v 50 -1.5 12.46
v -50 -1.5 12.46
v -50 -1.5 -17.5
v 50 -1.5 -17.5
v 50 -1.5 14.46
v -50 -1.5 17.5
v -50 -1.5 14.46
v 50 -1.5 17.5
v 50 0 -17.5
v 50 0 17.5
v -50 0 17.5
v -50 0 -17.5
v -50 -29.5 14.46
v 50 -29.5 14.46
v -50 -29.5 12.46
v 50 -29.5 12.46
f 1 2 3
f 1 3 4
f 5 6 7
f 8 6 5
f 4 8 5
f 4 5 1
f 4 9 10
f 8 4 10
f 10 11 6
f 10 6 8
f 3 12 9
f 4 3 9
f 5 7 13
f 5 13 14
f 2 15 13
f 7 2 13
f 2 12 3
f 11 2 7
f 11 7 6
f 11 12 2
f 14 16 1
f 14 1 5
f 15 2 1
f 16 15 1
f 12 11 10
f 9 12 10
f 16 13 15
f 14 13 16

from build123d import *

# Parameters (mm, degrees)
F0_W     = 100
F0_H     = 35
F1_DEPTH = 1.5
F2_W     = 100
F2_H     = 2
F3_DEPTH = 28


with BuildPart() as f1:
    # F0 (on Front) → F1 (new body)
    with BuildSketch(Plane.XZ):
        Rectangle(F0_W, F0_H)
    extrude(amount=F1_DEPTH)

    # F2 (on face) → F3 (join)
    with BuildSketch(Plane.XZ.offset(1.5)):
        with Locations((-1e-06, 13.460001)):
            Rectangle(F2_W, F2_H)
    extrude(amount=F3_DEPTH)


solid = f1.part
